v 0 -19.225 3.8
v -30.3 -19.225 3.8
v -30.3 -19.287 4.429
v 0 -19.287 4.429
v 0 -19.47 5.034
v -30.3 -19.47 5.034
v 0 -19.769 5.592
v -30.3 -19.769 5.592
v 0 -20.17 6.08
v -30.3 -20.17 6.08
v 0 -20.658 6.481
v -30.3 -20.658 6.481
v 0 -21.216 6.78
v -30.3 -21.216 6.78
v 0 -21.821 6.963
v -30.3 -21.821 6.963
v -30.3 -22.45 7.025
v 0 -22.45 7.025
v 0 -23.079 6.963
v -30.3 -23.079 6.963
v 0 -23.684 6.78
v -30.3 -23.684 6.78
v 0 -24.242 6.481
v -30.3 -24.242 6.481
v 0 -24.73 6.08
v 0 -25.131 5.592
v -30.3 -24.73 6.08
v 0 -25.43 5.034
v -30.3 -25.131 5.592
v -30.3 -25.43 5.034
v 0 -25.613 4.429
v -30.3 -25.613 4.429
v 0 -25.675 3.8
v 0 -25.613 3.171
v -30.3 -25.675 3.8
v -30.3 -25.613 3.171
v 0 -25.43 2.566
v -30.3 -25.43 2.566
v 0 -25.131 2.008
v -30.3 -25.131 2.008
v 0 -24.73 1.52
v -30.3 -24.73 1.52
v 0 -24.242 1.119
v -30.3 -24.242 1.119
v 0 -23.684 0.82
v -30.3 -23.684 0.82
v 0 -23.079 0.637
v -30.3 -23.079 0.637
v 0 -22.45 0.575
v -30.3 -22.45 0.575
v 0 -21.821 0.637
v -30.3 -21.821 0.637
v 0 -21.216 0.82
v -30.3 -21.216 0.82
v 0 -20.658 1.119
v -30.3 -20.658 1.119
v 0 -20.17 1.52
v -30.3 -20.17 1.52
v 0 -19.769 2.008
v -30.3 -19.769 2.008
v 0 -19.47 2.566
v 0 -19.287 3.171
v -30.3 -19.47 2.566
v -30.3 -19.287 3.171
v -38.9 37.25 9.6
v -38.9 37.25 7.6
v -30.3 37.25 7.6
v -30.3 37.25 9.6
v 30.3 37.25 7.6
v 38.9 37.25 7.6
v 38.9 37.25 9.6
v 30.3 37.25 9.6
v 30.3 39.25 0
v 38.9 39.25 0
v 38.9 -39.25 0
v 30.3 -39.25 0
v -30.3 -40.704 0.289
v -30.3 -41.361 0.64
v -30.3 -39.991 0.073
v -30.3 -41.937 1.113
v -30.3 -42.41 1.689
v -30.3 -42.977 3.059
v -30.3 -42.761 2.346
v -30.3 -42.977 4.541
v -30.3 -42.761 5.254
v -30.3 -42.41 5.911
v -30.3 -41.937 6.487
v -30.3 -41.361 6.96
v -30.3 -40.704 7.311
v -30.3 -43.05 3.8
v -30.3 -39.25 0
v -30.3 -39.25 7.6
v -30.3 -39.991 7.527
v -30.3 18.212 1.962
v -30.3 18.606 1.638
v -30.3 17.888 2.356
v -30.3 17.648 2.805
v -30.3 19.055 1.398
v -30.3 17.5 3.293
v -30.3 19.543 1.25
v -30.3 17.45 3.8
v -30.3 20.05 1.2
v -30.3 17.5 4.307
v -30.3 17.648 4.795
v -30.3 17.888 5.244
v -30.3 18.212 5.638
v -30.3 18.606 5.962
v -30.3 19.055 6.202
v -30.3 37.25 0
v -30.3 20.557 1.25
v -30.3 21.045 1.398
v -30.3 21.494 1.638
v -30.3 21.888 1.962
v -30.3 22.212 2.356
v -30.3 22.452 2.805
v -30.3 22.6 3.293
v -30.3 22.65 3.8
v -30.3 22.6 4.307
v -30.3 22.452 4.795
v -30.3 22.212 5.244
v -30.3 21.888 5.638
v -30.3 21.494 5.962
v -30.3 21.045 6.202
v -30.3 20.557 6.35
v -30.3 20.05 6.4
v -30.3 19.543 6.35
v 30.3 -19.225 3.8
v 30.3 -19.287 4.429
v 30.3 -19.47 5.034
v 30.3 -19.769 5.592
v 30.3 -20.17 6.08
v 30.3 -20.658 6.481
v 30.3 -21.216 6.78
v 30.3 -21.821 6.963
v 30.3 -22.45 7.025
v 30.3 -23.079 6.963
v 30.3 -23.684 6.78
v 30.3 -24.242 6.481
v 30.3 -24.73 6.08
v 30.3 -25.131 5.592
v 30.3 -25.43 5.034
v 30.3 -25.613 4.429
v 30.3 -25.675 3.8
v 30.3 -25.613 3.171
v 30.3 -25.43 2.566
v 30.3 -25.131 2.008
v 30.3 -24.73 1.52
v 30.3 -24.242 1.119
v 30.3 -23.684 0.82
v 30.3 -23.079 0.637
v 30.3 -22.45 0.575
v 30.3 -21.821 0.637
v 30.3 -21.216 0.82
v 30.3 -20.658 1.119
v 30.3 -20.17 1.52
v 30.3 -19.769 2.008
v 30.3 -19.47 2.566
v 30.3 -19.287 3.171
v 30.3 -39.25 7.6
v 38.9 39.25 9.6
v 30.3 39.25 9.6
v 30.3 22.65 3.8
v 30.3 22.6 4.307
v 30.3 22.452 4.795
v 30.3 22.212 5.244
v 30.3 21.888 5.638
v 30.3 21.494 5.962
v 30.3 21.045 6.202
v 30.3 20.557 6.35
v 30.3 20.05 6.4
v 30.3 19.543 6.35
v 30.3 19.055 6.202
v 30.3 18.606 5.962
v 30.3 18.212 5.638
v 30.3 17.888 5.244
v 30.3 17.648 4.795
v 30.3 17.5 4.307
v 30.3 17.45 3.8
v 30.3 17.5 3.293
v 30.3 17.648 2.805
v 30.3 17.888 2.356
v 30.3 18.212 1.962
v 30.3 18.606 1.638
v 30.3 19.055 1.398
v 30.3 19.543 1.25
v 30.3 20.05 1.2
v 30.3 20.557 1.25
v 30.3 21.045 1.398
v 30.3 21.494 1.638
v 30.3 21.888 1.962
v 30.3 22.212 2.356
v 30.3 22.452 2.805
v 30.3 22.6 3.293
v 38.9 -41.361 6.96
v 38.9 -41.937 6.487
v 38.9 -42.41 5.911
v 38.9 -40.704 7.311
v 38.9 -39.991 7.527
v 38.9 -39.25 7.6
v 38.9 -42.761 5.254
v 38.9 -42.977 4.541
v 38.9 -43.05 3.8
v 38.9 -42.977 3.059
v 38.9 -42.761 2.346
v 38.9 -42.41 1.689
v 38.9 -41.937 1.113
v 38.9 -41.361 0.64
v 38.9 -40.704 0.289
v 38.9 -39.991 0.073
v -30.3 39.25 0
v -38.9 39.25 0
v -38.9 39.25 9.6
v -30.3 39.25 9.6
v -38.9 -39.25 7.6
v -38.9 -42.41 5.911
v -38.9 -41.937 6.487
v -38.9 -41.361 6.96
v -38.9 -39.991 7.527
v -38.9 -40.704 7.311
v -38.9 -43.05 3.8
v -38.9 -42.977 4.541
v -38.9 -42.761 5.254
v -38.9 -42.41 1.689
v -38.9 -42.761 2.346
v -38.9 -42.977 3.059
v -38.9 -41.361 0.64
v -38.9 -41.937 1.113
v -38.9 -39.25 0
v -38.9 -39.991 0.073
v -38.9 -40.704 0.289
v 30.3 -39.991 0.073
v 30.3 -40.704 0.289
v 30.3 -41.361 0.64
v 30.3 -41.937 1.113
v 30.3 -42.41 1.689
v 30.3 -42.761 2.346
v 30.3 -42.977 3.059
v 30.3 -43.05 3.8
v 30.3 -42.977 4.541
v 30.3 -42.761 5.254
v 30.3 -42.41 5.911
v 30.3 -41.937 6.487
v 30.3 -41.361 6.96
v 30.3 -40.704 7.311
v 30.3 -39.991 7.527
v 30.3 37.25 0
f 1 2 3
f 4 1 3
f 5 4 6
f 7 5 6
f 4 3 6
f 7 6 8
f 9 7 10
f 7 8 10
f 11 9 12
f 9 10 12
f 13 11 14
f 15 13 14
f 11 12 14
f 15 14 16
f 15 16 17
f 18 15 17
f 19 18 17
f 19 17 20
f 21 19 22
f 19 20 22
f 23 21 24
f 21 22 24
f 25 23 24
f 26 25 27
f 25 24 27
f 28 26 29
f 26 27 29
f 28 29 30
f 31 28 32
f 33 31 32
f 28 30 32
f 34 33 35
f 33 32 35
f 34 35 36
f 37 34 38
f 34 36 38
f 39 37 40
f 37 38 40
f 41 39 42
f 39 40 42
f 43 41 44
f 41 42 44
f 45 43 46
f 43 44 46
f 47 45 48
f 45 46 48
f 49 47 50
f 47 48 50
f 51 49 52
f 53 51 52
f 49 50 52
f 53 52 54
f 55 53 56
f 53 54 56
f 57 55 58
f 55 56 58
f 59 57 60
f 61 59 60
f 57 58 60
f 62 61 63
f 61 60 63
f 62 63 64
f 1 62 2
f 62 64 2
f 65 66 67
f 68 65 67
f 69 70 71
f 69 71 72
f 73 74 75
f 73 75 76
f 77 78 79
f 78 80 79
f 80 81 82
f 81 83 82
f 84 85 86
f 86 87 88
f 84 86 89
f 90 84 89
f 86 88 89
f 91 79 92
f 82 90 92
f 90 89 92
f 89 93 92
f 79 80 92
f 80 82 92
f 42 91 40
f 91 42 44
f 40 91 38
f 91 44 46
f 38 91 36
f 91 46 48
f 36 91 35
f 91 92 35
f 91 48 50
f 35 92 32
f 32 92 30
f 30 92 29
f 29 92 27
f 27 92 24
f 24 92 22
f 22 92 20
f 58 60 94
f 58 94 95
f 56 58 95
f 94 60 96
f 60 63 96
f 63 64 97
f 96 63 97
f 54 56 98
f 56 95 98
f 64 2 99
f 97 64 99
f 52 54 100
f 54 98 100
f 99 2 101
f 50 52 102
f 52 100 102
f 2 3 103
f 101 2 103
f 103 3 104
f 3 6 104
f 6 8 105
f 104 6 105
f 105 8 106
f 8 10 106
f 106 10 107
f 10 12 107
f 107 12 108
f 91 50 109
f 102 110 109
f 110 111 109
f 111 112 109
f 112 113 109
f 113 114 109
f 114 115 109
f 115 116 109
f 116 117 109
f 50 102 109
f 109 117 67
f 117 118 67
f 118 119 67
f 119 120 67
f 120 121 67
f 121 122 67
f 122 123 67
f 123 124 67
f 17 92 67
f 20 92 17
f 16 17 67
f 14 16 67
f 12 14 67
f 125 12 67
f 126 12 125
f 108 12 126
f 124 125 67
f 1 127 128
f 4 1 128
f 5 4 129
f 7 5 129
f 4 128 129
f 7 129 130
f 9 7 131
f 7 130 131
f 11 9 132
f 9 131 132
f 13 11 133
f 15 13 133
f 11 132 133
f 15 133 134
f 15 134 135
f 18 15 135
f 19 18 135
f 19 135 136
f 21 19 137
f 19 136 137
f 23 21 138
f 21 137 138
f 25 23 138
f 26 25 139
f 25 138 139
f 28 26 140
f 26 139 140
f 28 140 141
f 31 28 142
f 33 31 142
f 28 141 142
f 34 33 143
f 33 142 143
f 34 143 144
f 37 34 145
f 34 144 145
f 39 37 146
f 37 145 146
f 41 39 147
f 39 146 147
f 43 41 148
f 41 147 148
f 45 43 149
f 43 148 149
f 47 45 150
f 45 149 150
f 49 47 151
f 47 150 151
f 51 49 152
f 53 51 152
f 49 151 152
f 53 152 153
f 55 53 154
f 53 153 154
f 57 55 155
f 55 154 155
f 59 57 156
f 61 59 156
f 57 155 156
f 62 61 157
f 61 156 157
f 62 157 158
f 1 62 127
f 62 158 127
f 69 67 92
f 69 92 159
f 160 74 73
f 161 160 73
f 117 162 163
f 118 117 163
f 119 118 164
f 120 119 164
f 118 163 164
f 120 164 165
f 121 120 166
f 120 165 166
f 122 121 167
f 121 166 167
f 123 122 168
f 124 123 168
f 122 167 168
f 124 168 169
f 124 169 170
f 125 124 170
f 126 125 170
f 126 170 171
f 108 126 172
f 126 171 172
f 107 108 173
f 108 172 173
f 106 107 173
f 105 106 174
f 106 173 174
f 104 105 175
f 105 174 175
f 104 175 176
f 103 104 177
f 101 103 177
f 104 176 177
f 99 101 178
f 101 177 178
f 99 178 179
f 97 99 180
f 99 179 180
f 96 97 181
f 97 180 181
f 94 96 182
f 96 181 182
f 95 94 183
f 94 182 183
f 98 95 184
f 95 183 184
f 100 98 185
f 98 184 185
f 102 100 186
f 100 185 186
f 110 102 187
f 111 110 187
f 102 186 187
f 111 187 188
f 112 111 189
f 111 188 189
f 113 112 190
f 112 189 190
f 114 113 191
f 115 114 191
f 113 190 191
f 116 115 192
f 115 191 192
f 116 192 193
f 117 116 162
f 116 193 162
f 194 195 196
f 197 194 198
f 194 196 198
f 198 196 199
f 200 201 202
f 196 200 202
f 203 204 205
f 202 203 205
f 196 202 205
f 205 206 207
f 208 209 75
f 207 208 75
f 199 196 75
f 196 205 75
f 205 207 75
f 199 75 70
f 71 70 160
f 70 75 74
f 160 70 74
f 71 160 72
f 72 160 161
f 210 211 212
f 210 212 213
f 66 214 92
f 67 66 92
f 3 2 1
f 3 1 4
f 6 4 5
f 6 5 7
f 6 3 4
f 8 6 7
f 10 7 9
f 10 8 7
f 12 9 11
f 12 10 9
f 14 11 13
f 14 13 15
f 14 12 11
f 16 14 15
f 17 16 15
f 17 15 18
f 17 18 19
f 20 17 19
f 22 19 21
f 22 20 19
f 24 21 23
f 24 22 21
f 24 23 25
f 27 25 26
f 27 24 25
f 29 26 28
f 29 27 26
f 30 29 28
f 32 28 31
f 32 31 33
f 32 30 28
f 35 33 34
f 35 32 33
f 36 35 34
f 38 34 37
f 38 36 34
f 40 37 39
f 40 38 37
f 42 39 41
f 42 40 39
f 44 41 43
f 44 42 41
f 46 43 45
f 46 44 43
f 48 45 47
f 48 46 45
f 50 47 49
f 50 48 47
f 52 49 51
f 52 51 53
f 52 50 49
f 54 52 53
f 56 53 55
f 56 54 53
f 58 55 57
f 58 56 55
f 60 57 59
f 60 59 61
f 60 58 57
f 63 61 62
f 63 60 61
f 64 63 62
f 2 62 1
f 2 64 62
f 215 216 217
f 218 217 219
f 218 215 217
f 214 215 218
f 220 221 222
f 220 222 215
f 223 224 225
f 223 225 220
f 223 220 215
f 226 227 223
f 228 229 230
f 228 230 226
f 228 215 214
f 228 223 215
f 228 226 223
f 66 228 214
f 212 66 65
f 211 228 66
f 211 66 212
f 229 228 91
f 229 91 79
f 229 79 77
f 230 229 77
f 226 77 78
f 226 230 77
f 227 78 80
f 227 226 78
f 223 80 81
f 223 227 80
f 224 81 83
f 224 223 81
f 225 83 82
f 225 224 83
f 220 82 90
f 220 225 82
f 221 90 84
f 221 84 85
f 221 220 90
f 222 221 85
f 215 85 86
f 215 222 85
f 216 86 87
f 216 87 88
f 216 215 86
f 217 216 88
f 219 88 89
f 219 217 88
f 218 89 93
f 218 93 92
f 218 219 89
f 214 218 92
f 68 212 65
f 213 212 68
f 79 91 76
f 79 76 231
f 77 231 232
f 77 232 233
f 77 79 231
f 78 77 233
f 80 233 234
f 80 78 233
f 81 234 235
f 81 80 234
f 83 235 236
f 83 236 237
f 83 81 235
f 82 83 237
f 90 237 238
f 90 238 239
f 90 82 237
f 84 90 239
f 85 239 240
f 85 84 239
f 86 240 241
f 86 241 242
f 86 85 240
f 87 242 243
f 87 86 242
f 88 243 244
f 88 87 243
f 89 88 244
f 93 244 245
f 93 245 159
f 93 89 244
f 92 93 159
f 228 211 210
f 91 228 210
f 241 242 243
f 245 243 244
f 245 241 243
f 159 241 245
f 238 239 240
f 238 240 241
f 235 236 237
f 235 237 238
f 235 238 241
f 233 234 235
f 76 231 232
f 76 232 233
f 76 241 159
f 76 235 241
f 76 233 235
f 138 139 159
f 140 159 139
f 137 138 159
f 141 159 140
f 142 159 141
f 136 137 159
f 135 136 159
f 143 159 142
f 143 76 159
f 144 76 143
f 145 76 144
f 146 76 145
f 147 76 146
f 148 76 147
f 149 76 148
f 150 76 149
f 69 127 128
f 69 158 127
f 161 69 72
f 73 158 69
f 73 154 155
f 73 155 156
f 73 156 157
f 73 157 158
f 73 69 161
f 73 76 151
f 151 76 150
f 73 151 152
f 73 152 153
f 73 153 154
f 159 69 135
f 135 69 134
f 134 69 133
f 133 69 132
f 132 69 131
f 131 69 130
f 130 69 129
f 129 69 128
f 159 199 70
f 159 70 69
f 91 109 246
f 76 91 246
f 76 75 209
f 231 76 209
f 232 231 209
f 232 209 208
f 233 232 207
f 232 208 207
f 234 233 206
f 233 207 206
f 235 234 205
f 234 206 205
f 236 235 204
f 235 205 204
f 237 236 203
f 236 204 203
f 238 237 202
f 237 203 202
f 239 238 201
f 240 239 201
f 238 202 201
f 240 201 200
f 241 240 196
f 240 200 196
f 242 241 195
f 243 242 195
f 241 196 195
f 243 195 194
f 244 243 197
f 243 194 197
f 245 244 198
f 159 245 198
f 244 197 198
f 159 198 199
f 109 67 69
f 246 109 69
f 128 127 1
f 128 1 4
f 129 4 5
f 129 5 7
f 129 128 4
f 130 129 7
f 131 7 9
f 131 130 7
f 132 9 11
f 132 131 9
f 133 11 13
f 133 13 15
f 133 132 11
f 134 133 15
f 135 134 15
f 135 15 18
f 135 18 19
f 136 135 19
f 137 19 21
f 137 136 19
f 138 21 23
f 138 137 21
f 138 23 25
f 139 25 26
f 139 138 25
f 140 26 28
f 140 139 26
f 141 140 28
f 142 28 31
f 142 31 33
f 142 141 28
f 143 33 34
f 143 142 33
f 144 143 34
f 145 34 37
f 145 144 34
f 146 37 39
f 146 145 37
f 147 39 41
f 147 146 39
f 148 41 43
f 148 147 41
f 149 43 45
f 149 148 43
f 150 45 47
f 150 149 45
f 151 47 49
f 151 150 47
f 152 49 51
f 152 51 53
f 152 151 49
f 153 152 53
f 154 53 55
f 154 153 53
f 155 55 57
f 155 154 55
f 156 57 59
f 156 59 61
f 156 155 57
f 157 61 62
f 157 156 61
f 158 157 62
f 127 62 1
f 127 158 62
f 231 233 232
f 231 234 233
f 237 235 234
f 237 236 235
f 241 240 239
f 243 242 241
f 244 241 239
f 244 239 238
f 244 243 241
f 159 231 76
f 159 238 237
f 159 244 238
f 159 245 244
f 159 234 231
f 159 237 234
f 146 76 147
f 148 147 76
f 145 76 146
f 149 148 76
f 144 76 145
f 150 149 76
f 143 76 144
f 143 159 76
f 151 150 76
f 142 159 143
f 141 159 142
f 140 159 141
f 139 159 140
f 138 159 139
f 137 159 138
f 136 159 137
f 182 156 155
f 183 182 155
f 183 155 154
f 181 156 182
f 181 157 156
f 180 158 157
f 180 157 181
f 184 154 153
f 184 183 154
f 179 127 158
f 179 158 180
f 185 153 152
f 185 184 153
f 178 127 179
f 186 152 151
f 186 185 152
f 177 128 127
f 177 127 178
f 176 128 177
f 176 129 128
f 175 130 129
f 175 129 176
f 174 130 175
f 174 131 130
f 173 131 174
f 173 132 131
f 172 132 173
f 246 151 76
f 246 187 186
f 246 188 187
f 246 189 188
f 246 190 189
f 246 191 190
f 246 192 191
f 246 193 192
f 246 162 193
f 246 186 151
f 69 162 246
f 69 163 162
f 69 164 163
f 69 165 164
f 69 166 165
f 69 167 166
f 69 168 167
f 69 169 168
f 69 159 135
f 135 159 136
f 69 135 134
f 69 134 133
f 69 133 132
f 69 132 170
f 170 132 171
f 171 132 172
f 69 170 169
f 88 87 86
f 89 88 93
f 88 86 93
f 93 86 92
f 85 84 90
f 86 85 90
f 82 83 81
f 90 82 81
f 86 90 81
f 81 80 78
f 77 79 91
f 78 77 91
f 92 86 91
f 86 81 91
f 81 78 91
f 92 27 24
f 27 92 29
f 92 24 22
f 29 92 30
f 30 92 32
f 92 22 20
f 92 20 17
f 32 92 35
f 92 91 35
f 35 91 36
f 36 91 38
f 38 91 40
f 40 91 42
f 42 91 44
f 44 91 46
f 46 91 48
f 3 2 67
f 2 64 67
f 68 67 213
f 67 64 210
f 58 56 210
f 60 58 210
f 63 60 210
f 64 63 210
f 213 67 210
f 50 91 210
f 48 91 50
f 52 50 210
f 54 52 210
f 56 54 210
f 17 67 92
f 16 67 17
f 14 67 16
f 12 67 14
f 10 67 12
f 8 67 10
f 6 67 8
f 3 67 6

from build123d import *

# Parameters (mm, degrees)
F0_W      = 8.6
F0_H      = 78.5
F1_DEPTH  = 7.6
F3_DEPTH  = 8.6
F4_W      = 8.6
F4_H      = 2
F5_DEPTH  = 2
F6_R      = 3.225
F7_DEPTH  = 30.3
F9_W      = 60.6
F9_H      = 76.5
F10_DEPTH = 7.6
F12_DEPTH = 60.6
F14_R     = 2.6
F15_DEPTH = 60.6


# Not quite as in the source:
# - a feature names something its author has since deleted; it is built from what else it names


with BuildPart() as f1:
    # F0 (on Top) → F1 (new body)
    with BuildSketch(Plane.XY):
        with Locations((-34.6, 0)):
            Rectangle(F0_W, F0_H)
    extrude(amount=F1_DEPTH)

    # F2 (on face) → F3 (join)
    with BuildSketch(Plane(origin=(-38.9, 0, 0), x_dir=(0, -1, 0), z_dir=(-1, 0, 0))):
        with BuildLine():
            Line((39.25, 7.6), (39.25, 0))
            ThreePointArc((39.25, 0), (43.05, 3.8), (39.25, 7.6))
        make_face()
    extrude(amount=-F3_DEPTH)

    # F4 (on face) → F5 (join)
    with BuildSketch(Plane.XY.offset(7.6)):
        with Locations((-34.6, 38.25)):
            Rectangle(F4_W, F4_H)
    extrude(amount=F5_DEPTH)

    # F6 (on face) → F7 (join)
    with BuildSketch(Plane.YZ.offset(-30.3)):
        with Locations((-22.45, 3.8)):
            Circle(F6_R)
    extrude(amount=F7_DEPTH)

    # F8: F1 across plane


with BuildPart() as f1_1:
    add(f1.part)
    add(f1.part.mirror(Plane.YZ))


with BuildPart() as f10:
    # F9 (on face) → F10 (new body)
    with BuildSketch(Plane.XY.offset(7.6)):
        with Locations((0, -1)):
            Rectangle(F9_W, F9_H)
    extrude(amount=-F10_DEPTH)


with BuildPart() as f12:
    # F11 (on face) → F12 (new body)
    with BuildSketch(Plane(origin=(-30.3, 0, 0), x_dir=(0, -1, 0), z_dir=(-1, 0, 0))):
        with BuildLine():
            Line((39.25, 7.6), (39.25, 0))
            ThreePointArc((39.25, 0), (43.05, 3.8), (39.25, 7.6))
        make_face()
    extrude(amount=-F12_DEPTH)

    # F13: union F10
    add(f10.part)

    # F14 (on face) → F15 (cut)
    with BuildSketch(Plane.YZ.offset(30.3)):
        with Locations((20.05, 3.8)):
            Circle(F14_R)
    extrude(amount=-F15_DEPTH, mode=Mode.SUBTRACT)

    # F17: cut F1
    add(f1_1.part, mode=Mode.SUBTRACT)


solid = Compound([f1_1.part, f12.part])
